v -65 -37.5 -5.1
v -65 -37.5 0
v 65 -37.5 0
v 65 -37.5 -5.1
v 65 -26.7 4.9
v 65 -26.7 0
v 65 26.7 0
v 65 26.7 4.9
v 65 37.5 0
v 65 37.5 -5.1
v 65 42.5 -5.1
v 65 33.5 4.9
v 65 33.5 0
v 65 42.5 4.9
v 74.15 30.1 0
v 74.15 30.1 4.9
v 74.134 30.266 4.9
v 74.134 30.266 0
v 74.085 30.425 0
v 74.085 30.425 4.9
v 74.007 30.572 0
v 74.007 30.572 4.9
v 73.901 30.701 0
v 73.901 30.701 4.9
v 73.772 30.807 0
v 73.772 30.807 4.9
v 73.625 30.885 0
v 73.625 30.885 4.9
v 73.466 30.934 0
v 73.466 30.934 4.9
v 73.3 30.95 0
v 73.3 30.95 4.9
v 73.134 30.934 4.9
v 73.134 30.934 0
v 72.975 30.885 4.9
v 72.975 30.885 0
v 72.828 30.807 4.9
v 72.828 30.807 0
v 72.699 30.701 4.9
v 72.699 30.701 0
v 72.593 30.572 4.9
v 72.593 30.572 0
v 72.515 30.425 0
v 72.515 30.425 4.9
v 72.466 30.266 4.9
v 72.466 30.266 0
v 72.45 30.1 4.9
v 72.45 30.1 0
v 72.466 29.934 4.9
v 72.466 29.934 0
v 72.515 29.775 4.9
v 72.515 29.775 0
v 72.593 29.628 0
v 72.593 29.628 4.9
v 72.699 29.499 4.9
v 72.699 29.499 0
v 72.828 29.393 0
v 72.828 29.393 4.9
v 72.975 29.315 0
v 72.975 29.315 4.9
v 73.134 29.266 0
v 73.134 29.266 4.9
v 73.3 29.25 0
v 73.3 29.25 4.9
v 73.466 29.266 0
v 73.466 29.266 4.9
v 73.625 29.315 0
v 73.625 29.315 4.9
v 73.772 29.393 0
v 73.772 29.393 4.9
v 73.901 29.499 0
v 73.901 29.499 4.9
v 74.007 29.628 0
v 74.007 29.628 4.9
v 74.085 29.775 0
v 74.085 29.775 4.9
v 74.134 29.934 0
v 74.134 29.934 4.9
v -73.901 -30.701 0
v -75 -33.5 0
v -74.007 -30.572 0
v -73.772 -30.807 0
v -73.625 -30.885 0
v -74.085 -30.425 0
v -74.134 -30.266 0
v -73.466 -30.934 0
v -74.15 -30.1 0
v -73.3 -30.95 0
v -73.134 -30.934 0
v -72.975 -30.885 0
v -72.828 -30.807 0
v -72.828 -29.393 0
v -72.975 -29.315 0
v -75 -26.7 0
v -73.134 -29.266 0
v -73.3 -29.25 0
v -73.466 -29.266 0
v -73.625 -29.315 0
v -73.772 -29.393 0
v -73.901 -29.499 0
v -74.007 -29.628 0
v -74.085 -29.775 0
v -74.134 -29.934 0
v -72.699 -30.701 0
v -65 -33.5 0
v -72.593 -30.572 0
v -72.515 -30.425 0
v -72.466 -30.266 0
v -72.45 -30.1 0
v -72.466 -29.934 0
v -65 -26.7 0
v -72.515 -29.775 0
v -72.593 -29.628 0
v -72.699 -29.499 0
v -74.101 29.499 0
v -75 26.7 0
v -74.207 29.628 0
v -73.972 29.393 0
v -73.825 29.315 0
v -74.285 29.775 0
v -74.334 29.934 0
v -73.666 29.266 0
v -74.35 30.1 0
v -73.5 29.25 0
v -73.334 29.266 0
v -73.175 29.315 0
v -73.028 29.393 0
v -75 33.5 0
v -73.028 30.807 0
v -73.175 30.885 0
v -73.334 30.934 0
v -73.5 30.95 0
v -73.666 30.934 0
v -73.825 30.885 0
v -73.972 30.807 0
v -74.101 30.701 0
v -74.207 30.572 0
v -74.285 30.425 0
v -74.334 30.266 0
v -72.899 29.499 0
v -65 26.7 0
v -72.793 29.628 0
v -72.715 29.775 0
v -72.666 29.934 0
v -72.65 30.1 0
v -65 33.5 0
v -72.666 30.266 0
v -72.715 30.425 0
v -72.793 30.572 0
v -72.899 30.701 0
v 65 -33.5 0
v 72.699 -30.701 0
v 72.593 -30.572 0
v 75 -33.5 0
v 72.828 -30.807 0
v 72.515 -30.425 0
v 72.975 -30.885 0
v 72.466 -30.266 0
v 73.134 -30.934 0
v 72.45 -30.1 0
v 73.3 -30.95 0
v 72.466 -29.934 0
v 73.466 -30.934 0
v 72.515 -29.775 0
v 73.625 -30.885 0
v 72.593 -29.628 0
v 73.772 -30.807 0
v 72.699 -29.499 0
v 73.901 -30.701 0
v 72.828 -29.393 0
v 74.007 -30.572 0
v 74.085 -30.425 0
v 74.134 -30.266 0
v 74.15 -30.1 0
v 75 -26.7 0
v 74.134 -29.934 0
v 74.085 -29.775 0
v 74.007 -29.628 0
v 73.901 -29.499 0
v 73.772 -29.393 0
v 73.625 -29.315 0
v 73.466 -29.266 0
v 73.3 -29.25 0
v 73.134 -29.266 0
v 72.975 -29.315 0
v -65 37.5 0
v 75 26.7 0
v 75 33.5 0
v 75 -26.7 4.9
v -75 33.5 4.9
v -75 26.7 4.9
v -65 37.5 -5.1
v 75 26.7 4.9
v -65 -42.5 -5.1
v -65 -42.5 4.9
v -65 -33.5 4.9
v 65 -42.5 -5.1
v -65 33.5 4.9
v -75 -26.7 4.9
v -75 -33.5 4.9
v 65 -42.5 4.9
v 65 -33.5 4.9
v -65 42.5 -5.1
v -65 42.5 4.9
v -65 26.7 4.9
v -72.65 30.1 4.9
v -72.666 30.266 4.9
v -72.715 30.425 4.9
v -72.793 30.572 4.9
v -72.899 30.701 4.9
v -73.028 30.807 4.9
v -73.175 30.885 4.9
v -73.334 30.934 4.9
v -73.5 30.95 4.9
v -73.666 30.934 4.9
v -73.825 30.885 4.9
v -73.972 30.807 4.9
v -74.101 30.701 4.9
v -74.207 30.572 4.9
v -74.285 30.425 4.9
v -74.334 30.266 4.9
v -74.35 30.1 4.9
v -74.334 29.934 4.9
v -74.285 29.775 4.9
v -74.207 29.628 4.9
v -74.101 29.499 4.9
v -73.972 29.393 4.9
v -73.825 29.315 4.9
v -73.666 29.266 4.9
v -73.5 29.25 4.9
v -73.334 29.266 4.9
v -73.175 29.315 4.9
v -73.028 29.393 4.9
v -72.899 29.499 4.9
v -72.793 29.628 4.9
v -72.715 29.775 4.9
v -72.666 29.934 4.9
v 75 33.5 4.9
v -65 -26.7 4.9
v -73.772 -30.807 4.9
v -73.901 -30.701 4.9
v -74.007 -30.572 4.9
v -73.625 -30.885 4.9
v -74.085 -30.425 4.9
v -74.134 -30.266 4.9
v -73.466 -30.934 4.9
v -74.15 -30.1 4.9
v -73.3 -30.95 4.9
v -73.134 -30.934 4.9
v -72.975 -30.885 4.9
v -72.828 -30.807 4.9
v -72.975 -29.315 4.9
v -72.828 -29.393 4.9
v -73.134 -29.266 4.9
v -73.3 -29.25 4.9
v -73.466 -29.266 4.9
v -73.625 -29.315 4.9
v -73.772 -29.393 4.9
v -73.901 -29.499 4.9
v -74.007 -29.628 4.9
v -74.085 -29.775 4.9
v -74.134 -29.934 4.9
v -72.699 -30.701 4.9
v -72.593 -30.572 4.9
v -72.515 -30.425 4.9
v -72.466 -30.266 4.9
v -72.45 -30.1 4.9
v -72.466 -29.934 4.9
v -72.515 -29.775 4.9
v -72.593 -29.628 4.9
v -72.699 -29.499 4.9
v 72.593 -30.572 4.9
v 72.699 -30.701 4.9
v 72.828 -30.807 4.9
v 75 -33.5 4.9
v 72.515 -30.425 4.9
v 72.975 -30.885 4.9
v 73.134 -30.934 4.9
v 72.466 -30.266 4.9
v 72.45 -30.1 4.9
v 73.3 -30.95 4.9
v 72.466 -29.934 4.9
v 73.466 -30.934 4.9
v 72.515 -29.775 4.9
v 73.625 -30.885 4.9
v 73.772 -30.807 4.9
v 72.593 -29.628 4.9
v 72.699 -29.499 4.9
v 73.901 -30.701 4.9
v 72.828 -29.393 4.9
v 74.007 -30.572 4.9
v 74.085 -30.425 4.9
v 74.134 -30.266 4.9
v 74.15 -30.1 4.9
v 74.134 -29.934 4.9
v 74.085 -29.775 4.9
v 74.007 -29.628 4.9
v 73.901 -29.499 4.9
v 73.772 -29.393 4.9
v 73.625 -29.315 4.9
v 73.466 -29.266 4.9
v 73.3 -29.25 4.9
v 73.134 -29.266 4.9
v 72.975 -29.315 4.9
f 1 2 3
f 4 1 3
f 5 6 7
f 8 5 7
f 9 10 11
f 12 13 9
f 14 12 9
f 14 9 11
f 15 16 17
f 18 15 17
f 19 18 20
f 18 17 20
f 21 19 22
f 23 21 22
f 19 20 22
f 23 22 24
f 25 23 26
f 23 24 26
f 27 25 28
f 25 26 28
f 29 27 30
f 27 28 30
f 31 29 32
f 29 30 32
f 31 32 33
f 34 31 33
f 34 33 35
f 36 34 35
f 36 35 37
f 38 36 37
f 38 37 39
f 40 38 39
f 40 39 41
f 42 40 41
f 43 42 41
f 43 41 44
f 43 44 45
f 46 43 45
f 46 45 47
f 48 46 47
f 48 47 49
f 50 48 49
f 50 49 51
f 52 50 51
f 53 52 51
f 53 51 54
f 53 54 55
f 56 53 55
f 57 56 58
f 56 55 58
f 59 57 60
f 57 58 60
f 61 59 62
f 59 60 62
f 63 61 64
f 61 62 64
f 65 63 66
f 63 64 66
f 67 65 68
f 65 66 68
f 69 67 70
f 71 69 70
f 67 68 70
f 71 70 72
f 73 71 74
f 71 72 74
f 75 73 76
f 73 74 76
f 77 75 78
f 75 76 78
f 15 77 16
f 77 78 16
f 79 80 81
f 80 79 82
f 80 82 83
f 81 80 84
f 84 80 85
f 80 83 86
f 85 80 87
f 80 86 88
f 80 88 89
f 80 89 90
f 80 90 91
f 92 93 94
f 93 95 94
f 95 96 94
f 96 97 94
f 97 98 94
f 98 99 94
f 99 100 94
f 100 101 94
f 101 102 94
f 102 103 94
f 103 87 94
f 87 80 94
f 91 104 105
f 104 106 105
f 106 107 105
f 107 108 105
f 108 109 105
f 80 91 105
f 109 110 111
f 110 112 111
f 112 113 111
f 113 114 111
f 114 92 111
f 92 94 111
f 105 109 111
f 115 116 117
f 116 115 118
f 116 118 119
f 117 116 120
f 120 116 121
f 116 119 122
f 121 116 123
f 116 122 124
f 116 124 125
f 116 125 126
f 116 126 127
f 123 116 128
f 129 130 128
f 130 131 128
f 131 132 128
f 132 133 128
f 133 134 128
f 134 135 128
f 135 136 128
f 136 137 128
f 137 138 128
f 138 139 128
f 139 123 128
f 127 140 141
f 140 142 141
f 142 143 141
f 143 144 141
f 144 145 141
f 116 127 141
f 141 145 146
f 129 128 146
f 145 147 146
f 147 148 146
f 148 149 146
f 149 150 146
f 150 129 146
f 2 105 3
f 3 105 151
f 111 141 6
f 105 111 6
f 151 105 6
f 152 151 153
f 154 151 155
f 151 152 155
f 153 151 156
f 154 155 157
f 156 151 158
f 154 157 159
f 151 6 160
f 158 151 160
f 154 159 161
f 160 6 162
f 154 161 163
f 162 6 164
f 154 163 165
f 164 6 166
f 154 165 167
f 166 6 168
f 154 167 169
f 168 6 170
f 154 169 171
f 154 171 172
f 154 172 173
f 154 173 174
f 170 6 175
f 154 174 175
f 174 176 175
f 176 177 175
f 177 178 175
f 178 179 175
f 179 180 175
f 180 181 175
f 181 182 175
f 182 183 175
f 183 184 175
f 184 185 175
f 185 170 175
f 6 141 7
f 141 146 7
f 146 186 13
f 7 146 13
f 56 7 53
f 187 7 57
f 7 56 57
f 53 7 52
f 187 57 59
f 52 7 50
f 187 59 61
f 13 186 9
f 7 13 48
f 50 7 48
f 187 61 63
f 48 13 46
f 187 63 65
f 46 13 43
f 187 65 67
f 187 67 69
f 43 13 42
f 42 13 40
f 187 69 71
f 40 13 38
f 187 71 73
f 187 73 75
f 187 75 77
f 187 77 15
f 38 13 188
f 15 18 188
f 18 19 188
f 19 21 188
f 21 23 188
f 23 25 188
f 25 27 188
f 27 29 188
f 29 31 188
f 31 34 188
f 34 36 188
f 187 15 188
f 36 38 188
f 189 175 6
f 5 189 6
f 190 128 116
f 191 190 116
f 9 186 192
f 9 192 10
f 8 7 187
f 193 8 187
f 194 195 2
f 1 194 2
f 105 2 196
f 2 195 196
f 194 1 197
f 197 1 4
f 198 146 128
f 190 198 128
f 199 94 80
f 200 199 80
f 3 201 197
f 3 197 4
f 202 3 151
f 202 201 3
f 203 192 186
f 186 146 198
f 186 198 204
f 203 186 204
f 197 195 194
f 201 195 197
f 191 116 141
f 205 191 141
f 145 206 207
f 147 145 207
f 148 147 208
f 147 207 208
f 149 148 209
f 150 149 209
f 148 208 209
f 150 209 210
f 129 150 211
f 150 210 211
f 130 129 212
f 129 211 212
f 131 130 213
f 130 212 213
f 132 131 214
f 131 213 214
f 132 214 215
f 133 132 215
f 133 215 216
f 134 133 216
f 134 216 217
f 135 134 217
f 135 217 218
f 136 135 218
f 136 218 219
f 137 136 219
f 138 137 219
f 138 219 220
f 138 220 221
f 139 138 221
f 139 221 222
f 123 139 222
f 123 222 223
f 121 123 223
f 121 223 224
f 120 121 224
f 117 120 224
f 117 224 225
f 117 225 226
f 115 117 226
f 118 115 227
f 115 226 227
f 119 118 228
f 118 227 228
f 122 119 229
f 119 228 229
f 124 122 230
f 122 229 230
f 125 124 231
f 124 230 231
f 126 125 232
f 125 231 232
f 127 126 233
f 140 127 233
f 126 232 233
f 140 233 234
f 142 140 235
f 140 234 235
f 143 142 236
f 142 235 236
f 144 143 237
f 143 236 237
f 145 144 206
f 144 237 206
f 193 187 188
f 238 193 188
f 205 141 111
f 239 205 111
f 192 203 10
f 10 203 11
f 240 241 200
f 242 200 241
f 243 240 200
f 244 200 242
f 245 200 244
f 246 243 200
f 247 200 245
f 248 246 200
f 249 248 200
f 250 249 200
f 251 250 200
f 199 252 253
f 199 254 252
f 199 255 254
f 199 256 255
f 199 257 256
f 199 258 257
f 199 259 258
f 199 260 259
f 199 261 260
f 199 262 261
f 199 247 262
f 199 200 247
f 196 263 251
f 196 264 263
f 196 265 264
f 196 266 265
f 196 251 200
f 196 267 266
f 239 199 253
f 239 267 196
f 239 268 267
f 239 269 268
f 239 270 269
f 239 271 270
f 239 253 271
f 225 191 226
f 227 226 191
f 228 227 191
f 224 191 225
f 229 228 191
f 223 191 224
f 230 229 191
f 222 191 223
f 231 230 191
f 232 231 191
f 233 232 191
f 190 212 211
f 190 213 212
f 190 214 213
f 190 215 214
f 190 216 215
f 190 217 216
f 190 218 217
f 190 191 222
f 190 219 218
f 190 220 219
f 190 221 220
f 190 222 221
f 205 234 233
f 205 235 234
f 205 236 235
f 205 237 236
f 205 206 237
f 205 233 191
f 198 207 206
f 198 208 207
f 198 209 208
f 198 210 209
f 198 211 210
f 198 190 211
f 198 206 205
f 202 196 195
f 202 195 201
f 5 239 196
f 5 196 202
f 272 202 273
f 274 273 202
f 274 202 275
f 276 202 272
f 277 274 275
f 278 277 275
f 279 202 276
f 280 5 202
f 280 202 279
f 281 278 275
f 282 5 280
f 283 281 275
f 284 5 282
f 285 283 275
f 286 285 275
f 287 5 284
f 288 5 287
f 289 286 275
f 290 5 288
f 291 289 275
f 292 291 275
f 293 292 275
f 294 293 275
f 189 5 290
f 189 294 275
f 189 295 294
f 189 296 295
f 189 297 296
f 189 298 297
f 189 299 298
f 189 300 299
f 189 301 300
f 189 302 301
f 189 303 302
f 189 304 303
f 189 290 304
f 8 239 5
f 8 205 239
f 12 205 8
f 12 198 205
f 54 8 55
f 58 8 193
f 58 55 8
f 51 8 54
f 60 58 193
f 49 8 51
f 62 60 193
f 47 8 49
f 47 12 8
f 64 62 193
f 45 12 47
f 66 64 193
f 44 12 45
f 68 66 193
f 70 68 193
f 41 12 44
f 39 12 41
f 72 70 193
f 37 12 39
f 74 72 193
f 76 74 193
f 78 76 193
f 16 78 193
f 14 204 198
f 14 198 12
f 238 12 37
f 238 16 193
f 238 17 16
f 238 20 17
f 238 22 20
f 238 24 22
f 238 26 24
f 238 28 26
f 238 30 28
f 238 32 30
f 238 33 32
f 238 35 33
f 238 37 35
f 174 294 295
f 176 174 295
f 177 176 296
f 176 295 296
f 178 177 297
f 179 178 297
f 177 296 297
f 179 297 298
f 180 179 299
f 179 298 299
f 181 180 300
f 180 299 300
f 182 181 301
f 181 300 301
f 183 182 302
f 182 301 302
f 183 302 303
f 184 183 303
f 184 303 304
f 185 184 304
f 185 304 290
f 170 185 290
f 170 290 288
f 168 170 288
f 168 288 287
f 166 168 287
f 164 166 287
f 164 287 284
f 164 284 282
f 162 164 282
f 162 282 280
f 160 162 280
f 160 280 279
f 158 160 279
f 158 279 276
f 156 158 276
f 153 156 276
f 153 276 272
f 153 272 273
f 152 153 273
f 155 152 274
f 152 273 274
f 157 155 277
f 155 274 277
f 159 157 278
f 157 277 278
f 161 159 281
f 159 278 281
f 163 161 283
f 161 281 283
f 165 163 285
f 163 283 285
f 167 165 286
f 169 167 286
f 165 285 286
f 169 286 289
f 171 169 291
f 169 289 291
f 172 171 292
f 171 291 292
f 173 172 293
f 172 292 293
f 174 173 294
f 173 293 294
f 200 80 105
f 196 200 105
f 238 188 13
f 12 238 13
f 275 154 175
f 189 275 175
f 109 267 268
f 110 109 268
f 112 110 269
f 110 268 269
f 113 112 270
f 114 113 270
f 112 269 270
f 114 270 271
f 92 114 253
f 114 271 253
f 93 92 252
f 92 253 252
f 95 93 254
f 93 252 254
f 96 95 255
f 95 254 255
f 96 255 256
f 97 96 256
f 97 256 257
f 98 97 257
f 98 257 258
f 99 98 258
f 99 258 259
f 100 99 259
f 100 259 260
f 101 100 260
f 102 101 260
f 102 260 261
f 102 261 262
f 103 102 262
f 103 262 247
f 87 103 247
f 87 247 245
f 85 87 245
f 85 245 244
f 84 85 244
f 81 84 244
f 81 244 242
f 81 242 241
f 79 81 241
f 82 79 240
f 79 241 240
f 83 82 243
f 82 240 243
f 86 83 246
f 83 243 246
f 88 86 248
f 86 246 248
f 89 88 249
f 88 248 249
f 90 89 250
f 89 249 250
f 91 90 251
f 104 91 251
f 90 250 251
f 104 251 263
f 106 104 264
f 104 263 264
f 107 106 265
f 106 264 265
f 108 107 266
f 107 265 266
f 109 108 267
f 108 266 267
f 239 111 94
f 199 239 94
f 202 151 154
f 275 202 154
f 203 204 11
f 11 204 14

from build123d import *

# Parameters (mm, degrees)
F1_DEPTH = 4.9
F2_R     = 0.85
F3_DEPTH = 4.901
F4_W     = 130
F4_H     = 4
F5_DEPTH = 4.9
F6_W     = 130
F6_H     = 5
F7_DEPTH = 10


with BuildPart() as f1:
    # F0 (on Top) → F1 (new body)
    with BuildSketch(Plane.XY):
        Polygon((-75, -33.5), (75, -33.5), (75, -26.7), (65, -26.7), (65, 26.7), (75, 26.7), (75, 33.5), (-75, 33.5), (-75, 26.7), (-65, 26.7), (-65, -26.7), (-75, -26.7), align=None)
    extrude(amount=F1_DEPTH)

    # F2 (on face) → F3 (cut, through all)
    with BuildSketch(Plane.XY.offset(4.9)):
        with Locations((-73.5, 30.1)):
            Circle(F2_R)
        with Locations((-73.3, -30.1)):
            Circle(F2_R)
        with Locations((73.3, 30.1)):
            Circle(F2_R)
        with Locations((73.3, -30.1)):
            Circle(F2_R)
    extrude(amount=-F3_DEPTH, mode=Mode.SUBTRACT)

    # F4 (on face) → F5 (join)
    with BuildSketch(Plane.XY.offset(4.9)):
        with Locations((0, 35.5)):
            Rectangle(F4_W, F4_H)
        with Locations((0, -35.5)):
            Rectangle(F4_W, F4_H)
    extrude(amount=-F5_DEPTH)

    # F6 (on face) → F7 (join)
    with BuildSketch(Plane.XY.offset(4.9)):
        with Locations((0, 40)):
            Rectangle(F6_W, F6_H)
        with Locations((0, -40)):
            Rectangle(F6_W, F6_H)
    extrude(amount=-F7_DEPTH)


solid = f1.part
